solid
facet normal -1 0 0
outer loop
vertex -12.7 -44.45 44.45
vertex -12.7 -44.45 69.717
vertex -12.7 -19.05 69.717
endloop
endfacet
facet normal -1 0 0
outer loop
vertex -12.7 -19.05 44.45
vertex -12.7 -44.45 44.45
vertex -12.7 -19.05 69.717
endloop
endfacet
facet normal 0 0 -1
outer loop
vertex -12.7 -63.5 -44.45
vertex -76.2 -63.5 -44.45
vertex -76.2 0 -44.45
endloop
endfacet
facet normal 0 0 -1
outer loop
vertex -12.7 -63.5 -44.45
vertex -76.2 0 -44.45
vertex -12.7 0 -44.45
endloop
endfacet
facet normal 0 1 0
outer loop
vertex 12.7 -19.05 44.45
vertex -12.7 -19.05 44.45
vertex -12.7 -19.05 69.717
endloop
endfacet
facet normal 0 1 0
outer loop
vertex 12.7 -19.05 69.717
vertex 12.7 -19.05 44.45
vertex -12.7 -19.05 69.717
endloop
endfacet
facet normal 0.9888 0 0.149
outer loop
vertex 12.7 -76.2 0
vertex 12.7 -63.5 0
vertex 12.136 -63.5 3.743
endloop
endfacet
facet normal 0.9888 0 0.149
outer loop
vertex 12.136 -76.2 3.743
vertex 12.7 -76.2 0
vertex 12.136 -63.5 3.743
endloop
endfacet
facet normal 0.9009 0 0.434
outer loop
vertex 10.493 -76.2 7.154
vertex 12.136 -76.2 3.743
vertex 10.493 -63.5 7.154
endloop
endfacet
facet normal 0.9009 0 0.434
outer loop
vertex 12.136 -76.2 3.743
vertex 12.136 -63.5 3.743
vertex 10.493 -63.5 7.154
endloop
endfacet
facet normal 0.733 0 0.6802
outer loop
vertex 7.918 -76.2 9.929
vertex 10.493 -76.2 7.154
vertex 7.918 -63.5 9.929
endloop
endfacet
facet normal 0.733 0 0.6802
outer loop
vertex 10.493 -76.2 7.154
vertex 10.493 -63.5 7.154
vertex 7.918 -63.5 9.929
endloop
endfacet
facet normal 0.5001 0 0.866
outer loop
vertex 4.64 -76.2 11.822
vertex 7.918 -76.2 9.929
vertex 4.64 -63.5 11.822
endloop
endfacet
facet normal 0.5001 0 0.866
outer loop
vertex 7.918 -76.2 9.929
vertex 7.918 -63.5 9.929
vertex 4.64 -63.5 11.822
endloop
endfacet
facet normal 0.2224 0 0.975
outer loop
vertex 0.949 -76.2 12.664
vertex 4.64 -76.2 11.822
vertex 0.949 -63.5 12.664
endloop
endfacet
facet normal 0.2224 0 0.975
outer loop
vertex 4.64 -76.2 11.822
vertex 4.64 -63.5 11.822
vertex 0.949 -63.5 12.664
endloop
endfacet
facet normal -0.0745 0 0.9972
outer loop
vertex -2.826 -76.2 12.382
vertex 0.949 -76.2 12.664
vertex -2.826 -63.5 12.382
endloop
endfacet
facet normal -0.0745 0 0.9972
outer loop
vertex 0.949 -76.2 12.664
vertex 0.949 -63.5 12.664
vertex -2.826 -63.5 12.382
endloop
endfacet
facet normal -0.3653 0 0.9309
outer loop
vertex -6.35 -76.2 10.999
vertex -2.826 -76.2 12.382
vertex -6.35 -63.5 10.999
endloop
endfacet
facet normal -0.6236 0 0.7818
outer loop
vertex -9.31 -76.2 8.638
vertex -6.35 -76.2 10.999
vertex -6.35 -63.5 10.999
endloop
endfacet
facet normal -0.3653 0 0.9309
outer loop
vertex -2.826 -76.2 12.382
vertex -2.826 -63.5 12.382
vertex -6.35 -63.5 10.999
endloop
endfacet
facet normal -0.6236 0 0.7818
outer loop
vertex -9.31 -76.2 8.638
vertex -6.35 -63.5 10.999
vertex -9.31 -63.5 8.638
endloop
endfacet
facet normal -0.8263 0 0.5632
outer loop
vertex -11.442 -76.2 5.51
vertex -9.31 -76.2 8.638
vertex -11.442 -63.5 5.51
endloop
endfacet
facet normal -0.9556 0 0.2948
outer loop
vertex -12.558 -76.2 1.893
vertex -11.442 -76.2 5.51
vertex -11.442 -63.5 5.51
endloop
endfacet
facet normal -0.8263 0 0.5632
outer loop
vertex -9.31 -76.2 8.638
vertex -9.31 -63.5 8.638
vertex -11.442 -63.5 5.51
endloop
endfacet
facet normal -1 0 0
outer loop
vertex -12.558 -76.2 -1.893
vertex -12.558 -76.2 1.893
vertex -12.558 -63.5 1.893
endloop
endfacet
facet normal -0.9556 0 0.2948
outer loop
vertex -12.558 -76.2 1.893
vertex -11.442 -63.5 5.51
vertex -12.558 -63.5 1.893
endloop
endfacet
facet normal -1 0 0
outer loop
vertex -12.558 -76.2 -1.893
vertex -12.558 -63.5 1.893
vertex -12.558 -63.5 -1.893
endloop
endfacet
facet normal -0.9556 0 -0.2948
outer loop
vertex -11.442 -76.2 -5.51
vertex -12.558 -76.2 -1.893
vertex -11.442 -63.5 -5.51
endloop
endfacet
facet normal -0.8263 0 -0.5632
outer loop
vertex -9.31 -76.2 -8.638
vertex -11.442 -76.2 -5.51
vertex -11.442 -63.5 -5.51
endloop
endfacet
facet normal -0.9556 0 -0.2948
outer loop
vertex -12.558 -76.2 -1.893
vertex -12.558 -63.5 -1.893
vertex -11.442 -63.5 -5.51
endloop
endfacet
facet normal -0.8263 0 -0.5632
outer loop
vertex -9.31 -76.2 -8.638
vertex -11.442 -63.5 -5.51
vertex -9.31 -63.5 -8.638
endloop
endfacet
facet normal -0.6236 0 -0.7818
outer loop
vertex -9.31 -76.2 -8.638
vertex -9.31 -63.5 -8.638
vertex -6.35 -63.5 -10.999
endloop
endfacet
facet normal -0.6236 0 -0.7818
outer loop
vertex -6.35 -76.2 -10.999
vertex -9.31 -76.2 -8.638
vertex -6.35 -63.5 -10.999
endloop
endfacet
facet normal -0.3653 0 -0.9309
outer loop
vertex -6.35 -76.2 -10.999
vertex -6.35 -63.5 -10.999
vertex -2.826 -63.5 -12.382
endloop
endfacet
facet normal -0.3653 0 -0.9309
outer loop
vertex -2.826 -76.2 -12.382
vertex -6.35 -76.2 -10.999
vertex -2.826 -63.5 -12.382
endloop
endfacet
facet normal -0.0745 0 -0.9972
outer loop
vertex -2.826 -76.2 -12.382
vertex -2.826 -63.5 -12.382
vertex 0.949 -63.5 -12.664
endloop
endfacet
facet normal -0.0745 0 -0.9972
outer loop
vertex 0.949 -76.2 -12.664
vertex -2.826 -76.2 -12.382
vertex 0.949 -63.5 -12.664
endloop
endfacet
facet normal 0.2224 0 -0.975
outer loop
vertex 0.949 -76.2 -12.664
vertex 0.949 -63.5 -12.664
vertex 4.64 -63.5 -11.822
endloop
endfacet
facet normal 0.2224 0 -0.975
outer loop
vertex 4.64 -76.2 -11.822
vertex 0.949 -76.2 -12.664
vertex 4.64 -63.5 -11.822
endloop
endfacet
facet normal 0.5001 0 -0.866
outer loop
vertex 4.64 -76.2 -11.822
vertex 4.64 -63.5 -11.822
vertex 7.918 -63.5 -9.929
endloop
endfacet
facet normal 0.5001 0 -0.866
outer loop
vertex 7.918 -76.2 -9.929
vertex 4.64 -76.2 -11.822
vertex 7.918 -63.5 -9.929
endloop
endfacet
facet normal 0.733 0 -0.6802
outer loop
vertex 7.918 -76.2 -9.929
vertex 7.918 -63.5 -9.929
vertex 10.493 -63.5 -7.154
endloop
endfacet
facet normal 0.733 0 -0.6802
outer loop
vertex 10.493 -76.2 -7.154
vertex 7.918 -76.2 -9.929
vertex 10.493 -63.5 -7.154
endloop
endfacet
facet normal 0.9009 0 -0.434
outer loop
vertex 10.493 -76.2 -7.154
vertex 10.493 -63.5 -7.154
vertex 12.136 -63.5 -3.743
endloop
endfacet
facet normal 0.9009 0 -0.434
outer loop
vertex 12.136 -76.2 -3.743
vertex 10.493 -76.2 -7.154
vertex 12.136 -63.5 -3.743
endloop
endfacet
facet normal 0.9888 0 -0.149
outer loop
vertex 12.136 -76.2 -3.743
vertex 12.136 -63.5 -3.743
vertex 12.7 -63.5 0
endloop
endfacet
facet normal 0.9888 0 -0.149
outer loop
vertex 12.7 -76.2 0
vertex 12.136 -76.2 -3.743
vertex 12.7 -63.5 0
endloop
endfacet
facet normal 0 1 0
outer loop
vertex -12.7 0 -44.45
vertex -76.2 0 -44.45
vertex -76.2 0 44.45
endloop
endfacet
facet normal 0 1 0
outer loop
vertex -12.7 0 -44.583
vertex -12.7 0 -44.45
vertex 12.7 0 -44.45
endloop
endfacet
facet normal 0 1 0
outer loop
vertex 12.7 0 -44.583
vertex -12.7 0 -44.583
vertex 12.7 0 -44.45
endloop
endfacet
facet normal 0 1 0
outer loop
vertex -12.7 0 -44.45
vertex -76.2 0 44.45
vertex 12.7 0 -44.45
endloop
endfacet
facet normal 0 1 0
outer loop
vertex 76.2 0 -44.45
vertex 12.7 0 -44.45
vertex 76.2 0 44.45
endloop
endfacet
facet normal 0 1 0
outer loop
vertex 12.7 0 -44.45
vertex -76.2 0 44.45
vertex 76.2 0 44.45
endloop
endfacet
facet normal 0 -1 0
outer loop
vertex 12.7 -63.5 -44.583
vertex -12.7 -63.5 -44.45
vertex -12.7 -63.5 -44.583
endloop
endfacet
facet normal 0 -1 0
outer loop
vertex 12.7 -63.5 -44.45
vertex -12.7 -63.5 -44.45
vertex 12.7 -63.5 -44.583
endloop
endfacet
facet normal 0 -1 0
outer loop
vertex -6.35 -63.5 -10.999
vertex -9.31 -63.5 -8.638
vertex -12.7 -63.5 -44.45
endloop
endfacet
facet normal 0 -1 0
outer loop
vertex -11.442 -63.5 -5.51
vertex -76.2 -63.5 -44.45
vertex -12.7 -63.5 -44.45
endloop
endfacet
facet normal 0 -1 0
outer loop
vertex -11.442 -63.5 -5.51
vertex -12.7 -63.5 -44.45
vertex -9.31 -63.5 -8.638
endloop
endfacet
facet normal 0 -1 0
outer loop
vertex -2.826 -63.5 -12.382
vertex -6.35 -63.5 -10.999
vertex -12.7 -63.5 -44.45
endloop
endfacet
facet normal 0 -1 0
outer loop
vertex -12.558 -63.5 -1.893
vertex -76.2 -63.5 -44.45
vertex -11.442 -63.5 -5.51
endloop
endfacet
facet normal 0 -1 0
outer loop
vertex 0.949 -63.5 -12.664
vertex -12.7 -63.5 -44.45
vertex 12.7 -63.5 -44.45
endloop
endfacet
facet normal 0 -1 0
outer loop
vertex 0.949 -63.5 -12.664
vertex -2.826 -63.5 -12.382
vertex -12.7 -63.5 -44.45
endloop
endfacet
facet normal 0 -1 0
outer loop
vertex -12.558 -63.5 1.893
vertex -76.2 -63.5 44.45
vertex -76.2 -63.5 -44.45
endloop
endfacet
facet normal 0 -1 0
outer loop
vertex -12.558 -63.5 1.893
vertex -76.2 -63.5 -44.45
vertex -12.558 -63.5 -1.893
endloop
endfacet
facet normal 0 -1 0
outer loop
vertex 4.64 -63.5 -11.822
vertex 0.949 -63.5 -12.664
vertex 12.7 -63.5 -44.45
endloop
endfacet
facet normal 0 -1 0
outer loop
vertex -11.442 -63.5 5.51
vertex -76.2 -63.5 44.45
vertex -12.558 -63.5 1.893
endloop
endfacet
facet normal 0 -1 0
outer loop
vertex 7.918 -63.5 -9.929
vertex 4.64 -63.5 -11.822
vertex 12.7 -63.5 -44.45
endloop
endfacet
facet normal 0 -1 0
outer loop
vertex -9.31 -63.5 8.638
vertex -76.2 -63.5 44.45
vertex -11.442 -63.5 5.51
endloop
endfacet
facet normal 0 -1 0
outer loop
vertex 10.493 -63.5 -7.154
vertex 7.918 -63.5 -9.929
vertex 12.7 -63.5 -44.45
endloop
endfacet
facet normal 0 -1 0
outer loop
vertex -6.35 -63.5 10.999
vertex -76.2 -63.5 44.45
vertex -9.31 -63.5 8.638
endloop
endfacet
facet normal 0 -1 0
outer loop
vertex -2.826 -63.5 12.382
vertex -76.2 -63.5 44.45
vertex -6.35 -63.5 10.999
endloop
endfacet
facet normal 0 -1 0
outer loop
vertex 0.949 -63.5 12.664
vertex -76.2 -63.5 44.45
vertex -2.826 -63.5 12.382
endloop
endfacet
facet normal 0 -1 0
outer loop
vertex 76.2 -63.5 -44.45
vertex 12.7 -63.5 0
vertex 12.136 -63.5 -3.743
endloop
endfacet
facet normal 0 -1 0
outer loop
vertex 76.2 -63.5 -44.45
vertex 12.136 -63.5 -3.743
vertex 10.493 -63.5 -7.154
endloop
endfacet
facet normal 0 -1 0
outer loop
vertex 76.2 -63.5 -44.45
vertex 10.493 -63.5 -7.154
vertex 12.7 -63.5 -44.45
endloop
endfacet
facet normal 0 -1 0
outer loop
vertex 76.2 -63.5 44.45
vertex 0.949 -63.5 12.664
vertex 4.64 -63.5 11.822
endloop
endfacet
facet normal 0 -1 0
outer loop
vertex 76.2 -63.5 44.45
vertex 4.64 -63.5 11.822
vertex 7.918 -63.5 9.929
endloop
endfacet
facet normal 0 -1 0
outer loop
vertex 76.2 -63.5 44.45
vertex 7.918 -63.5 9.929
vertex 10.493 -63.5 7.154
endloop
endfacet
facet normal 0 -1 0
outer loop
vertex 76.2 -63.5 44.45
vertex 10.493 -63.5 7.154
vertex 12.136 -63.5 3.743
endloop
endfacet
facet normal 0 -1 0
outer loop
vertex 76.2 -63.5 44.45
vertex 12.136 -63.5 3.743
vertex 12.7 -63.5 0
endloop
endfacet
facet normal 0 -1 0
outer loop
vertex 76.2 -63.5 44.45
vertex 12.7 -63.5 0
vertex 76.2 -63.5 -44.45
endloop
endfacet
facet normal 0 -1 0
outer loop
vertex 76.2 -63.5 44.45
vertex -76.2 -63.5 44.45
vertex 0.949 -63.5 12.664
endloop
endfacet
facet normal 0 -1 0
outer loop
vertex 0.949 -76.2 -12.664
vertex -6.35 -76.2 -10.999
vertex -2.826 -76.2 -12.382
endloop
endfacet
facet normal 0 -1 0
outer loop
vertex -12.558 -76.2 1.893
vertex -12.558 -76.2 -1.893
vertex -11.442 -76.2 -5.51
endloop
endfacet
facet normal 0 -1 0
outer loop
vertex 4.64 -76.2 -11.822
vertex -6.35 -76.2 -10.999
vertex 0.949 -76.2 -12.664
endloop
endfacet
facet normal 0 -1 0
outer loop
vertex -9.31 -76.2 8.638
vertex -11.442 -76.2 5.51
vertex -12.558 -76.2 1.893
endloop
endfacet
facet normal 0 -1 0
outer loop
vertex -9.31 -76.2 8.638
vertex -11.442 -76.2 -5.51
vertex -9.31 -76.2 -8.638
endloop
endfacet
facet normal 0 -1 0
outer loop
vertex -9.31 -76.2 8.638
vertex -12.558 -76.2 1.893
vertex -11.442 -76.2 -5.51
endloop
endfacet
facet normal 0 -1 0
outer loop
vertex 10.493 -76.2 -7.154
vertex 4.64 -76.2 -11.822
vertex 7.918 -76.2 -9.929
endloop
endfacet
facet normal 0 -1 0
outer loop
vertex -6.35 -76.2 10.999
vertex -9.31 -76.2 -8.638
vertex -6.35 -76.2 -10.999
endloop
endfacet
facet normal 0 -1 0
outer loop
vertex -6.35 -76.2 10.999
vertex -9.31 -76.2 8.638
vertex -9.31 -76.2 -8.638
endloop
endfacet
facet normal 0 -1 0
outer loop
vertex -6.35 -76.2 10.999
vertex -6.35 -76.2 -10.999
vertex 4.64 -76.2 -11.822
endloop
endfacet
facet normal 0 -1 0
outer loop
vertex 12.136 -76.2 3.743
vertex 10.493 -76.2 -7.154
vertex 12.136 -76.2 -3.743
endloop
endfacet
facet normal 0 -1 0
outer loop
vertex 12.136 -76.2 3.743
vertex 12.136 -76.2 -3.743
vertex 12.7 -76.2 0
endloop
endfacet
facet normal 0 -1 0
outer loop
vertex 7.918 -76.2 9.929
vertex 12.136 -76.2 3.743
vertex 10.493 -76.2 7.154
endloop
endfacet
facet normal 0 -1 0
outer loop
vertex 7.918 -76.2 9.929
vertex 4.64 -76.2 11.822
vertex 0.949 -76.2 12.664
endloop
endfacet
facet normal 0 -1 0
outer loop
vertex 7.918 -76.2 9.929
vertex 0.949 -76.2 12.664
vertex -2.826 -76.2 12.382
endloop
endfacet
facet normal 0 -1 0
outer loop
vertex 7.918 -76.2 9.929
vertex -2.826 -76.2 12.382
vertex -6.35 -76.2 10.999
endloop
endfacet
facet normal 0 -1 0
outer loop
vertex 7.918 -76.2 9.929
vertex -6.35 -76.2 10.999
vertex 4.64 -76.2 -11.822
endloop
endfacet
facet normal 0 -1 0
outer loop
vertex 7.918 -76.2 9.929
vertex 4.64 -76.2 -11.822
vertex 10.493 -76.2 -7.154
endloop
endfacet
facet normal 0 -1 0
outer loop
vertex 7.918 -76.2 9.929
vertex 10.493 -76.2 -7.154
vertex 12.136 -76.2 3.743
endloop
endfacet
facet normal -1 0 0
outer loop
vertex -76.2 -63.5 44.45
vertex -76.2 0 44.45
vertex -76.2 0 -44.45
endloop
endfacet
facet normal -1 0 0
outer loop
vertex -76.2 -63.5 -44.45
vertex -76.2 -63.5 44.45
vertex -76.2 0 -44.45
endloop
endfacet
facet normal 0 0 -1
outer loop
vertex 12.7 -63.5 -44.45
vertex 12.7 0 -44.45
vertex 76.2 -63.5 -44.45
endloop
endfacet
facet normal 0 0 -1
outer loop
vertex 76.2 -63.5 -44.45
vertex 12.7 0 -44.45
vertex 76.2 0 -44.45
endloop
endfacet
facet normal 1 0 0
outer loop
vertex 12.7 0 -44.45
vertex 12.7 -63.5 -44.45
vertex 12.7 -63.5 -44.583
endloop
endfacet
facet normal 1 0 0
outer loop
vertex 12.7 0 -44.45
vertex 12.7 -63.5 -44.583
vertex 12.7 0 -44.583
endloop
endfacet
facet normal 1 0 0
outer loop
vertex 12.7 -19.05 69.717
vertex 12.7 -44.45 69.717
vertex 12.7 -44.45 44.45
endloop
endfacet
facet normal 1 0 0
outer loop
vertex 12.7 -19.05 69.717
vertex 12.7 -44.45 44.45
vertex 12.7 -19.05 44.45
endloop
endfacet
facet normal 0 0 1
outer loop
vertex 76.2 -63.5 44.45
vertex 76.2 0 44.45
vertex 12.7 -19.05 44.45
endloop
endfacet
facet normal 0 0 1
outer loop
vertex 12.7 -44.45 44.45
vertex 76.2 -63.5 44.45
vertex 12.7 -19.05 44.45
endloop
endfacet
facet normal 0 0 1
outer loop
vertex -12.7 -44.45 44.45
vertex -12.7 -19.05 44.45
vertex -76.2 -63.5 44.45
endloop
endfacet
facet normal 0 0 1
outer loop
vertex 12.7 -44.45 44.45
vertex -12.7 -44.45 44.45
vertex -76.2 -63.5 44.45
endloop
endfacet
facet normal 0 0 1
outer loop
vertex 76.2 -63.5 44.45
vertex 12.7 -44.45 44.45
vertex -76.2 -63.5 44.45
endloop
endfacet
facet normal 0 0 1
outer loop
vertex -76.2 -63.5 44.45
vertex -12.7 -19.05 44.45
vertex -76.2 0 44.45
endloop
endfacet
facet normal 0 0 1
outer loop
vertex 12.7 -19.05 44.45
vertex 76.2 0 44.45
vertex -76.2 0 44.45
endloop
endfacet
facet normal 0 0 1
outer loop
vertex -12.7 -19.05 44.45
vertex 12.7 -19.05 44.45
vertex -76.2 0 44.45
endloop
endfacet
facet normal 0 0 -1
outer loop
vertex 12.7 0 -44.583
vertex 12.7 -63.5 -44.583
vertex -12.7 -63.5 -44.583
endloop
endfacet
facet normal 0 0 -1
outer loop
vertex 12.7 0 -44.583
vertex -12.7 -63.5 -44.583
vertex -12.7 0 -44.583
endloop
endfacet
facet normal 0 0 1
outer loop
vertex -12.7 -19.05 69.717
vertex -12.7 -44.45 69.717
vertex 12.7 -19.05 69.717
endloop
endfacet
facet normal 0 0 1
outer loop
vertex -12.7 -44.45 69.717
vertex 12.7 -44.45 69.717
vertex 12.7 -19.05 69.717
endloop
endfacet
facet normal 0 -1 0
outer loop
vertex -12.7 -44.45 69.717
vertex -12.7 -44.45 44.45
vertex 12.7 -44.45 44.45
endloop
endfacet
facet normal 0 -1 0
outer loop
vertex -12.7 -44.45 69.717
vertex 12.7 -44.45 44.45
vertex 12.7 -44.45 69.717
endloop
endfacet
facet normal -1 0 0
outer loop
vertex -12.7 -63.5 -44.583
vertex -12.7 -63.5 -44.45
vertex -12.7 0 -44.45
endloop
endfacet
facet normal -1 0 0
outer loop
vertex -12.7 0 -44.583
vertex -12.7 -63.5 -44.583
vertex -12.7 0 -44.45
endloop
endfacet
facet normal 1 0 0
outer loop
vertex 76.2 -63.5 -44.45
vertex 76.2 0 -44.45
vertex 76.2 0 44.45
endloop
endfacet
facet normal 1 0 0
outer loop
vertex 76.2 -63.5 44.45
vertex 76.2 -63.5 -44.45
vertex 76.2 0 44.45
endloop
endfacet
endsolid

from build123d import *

# Parameters (mm, degrees)
F0_R     = 12.7
F1_DEPTH = 63.5
F2_DEPTH = 76.2
F3_W     = 25.4
F3_H     = 25.4
F4_DEPTH = 12.7


with BuildPart() as f1:
    # F0 (on Front) → F1 (new body)
    with BuildSketch(Plane.XZ):
        Polygon((-12.7, 44.45), (-76.2, 44.45), (-76.2, -44.45), (76.2, -44.45), (76.2, 44.45), (12.7, 44.45), align=None)
        Circle(F0_R, mode=Mode.SUBTRACT)
    extrude(amount=F1_DEPTH)

    # F0 (on Front) → F2 (join)
    with BuildSketch(Plane.XZ):
        Circle(F0_R)
    extrude(amount=F2_DEPTH)

    # F3 (on Right) → F4 (join, symmetric)
    with BuildSketch(Plane.YZ):
        Polygon((-44.45, 44.316916), (-63.5, 44.316916), (-63.5, -44.583084), (0, -44.583084), (0, 44.316916), (-19.05, 44.316916), align=None)
        with Locations((-31.75, 57.016916)):
            Rectangle(F3_W, F3_H)
    extrude(amount=F4_DEPTH, both=True)


solid = f1.part
